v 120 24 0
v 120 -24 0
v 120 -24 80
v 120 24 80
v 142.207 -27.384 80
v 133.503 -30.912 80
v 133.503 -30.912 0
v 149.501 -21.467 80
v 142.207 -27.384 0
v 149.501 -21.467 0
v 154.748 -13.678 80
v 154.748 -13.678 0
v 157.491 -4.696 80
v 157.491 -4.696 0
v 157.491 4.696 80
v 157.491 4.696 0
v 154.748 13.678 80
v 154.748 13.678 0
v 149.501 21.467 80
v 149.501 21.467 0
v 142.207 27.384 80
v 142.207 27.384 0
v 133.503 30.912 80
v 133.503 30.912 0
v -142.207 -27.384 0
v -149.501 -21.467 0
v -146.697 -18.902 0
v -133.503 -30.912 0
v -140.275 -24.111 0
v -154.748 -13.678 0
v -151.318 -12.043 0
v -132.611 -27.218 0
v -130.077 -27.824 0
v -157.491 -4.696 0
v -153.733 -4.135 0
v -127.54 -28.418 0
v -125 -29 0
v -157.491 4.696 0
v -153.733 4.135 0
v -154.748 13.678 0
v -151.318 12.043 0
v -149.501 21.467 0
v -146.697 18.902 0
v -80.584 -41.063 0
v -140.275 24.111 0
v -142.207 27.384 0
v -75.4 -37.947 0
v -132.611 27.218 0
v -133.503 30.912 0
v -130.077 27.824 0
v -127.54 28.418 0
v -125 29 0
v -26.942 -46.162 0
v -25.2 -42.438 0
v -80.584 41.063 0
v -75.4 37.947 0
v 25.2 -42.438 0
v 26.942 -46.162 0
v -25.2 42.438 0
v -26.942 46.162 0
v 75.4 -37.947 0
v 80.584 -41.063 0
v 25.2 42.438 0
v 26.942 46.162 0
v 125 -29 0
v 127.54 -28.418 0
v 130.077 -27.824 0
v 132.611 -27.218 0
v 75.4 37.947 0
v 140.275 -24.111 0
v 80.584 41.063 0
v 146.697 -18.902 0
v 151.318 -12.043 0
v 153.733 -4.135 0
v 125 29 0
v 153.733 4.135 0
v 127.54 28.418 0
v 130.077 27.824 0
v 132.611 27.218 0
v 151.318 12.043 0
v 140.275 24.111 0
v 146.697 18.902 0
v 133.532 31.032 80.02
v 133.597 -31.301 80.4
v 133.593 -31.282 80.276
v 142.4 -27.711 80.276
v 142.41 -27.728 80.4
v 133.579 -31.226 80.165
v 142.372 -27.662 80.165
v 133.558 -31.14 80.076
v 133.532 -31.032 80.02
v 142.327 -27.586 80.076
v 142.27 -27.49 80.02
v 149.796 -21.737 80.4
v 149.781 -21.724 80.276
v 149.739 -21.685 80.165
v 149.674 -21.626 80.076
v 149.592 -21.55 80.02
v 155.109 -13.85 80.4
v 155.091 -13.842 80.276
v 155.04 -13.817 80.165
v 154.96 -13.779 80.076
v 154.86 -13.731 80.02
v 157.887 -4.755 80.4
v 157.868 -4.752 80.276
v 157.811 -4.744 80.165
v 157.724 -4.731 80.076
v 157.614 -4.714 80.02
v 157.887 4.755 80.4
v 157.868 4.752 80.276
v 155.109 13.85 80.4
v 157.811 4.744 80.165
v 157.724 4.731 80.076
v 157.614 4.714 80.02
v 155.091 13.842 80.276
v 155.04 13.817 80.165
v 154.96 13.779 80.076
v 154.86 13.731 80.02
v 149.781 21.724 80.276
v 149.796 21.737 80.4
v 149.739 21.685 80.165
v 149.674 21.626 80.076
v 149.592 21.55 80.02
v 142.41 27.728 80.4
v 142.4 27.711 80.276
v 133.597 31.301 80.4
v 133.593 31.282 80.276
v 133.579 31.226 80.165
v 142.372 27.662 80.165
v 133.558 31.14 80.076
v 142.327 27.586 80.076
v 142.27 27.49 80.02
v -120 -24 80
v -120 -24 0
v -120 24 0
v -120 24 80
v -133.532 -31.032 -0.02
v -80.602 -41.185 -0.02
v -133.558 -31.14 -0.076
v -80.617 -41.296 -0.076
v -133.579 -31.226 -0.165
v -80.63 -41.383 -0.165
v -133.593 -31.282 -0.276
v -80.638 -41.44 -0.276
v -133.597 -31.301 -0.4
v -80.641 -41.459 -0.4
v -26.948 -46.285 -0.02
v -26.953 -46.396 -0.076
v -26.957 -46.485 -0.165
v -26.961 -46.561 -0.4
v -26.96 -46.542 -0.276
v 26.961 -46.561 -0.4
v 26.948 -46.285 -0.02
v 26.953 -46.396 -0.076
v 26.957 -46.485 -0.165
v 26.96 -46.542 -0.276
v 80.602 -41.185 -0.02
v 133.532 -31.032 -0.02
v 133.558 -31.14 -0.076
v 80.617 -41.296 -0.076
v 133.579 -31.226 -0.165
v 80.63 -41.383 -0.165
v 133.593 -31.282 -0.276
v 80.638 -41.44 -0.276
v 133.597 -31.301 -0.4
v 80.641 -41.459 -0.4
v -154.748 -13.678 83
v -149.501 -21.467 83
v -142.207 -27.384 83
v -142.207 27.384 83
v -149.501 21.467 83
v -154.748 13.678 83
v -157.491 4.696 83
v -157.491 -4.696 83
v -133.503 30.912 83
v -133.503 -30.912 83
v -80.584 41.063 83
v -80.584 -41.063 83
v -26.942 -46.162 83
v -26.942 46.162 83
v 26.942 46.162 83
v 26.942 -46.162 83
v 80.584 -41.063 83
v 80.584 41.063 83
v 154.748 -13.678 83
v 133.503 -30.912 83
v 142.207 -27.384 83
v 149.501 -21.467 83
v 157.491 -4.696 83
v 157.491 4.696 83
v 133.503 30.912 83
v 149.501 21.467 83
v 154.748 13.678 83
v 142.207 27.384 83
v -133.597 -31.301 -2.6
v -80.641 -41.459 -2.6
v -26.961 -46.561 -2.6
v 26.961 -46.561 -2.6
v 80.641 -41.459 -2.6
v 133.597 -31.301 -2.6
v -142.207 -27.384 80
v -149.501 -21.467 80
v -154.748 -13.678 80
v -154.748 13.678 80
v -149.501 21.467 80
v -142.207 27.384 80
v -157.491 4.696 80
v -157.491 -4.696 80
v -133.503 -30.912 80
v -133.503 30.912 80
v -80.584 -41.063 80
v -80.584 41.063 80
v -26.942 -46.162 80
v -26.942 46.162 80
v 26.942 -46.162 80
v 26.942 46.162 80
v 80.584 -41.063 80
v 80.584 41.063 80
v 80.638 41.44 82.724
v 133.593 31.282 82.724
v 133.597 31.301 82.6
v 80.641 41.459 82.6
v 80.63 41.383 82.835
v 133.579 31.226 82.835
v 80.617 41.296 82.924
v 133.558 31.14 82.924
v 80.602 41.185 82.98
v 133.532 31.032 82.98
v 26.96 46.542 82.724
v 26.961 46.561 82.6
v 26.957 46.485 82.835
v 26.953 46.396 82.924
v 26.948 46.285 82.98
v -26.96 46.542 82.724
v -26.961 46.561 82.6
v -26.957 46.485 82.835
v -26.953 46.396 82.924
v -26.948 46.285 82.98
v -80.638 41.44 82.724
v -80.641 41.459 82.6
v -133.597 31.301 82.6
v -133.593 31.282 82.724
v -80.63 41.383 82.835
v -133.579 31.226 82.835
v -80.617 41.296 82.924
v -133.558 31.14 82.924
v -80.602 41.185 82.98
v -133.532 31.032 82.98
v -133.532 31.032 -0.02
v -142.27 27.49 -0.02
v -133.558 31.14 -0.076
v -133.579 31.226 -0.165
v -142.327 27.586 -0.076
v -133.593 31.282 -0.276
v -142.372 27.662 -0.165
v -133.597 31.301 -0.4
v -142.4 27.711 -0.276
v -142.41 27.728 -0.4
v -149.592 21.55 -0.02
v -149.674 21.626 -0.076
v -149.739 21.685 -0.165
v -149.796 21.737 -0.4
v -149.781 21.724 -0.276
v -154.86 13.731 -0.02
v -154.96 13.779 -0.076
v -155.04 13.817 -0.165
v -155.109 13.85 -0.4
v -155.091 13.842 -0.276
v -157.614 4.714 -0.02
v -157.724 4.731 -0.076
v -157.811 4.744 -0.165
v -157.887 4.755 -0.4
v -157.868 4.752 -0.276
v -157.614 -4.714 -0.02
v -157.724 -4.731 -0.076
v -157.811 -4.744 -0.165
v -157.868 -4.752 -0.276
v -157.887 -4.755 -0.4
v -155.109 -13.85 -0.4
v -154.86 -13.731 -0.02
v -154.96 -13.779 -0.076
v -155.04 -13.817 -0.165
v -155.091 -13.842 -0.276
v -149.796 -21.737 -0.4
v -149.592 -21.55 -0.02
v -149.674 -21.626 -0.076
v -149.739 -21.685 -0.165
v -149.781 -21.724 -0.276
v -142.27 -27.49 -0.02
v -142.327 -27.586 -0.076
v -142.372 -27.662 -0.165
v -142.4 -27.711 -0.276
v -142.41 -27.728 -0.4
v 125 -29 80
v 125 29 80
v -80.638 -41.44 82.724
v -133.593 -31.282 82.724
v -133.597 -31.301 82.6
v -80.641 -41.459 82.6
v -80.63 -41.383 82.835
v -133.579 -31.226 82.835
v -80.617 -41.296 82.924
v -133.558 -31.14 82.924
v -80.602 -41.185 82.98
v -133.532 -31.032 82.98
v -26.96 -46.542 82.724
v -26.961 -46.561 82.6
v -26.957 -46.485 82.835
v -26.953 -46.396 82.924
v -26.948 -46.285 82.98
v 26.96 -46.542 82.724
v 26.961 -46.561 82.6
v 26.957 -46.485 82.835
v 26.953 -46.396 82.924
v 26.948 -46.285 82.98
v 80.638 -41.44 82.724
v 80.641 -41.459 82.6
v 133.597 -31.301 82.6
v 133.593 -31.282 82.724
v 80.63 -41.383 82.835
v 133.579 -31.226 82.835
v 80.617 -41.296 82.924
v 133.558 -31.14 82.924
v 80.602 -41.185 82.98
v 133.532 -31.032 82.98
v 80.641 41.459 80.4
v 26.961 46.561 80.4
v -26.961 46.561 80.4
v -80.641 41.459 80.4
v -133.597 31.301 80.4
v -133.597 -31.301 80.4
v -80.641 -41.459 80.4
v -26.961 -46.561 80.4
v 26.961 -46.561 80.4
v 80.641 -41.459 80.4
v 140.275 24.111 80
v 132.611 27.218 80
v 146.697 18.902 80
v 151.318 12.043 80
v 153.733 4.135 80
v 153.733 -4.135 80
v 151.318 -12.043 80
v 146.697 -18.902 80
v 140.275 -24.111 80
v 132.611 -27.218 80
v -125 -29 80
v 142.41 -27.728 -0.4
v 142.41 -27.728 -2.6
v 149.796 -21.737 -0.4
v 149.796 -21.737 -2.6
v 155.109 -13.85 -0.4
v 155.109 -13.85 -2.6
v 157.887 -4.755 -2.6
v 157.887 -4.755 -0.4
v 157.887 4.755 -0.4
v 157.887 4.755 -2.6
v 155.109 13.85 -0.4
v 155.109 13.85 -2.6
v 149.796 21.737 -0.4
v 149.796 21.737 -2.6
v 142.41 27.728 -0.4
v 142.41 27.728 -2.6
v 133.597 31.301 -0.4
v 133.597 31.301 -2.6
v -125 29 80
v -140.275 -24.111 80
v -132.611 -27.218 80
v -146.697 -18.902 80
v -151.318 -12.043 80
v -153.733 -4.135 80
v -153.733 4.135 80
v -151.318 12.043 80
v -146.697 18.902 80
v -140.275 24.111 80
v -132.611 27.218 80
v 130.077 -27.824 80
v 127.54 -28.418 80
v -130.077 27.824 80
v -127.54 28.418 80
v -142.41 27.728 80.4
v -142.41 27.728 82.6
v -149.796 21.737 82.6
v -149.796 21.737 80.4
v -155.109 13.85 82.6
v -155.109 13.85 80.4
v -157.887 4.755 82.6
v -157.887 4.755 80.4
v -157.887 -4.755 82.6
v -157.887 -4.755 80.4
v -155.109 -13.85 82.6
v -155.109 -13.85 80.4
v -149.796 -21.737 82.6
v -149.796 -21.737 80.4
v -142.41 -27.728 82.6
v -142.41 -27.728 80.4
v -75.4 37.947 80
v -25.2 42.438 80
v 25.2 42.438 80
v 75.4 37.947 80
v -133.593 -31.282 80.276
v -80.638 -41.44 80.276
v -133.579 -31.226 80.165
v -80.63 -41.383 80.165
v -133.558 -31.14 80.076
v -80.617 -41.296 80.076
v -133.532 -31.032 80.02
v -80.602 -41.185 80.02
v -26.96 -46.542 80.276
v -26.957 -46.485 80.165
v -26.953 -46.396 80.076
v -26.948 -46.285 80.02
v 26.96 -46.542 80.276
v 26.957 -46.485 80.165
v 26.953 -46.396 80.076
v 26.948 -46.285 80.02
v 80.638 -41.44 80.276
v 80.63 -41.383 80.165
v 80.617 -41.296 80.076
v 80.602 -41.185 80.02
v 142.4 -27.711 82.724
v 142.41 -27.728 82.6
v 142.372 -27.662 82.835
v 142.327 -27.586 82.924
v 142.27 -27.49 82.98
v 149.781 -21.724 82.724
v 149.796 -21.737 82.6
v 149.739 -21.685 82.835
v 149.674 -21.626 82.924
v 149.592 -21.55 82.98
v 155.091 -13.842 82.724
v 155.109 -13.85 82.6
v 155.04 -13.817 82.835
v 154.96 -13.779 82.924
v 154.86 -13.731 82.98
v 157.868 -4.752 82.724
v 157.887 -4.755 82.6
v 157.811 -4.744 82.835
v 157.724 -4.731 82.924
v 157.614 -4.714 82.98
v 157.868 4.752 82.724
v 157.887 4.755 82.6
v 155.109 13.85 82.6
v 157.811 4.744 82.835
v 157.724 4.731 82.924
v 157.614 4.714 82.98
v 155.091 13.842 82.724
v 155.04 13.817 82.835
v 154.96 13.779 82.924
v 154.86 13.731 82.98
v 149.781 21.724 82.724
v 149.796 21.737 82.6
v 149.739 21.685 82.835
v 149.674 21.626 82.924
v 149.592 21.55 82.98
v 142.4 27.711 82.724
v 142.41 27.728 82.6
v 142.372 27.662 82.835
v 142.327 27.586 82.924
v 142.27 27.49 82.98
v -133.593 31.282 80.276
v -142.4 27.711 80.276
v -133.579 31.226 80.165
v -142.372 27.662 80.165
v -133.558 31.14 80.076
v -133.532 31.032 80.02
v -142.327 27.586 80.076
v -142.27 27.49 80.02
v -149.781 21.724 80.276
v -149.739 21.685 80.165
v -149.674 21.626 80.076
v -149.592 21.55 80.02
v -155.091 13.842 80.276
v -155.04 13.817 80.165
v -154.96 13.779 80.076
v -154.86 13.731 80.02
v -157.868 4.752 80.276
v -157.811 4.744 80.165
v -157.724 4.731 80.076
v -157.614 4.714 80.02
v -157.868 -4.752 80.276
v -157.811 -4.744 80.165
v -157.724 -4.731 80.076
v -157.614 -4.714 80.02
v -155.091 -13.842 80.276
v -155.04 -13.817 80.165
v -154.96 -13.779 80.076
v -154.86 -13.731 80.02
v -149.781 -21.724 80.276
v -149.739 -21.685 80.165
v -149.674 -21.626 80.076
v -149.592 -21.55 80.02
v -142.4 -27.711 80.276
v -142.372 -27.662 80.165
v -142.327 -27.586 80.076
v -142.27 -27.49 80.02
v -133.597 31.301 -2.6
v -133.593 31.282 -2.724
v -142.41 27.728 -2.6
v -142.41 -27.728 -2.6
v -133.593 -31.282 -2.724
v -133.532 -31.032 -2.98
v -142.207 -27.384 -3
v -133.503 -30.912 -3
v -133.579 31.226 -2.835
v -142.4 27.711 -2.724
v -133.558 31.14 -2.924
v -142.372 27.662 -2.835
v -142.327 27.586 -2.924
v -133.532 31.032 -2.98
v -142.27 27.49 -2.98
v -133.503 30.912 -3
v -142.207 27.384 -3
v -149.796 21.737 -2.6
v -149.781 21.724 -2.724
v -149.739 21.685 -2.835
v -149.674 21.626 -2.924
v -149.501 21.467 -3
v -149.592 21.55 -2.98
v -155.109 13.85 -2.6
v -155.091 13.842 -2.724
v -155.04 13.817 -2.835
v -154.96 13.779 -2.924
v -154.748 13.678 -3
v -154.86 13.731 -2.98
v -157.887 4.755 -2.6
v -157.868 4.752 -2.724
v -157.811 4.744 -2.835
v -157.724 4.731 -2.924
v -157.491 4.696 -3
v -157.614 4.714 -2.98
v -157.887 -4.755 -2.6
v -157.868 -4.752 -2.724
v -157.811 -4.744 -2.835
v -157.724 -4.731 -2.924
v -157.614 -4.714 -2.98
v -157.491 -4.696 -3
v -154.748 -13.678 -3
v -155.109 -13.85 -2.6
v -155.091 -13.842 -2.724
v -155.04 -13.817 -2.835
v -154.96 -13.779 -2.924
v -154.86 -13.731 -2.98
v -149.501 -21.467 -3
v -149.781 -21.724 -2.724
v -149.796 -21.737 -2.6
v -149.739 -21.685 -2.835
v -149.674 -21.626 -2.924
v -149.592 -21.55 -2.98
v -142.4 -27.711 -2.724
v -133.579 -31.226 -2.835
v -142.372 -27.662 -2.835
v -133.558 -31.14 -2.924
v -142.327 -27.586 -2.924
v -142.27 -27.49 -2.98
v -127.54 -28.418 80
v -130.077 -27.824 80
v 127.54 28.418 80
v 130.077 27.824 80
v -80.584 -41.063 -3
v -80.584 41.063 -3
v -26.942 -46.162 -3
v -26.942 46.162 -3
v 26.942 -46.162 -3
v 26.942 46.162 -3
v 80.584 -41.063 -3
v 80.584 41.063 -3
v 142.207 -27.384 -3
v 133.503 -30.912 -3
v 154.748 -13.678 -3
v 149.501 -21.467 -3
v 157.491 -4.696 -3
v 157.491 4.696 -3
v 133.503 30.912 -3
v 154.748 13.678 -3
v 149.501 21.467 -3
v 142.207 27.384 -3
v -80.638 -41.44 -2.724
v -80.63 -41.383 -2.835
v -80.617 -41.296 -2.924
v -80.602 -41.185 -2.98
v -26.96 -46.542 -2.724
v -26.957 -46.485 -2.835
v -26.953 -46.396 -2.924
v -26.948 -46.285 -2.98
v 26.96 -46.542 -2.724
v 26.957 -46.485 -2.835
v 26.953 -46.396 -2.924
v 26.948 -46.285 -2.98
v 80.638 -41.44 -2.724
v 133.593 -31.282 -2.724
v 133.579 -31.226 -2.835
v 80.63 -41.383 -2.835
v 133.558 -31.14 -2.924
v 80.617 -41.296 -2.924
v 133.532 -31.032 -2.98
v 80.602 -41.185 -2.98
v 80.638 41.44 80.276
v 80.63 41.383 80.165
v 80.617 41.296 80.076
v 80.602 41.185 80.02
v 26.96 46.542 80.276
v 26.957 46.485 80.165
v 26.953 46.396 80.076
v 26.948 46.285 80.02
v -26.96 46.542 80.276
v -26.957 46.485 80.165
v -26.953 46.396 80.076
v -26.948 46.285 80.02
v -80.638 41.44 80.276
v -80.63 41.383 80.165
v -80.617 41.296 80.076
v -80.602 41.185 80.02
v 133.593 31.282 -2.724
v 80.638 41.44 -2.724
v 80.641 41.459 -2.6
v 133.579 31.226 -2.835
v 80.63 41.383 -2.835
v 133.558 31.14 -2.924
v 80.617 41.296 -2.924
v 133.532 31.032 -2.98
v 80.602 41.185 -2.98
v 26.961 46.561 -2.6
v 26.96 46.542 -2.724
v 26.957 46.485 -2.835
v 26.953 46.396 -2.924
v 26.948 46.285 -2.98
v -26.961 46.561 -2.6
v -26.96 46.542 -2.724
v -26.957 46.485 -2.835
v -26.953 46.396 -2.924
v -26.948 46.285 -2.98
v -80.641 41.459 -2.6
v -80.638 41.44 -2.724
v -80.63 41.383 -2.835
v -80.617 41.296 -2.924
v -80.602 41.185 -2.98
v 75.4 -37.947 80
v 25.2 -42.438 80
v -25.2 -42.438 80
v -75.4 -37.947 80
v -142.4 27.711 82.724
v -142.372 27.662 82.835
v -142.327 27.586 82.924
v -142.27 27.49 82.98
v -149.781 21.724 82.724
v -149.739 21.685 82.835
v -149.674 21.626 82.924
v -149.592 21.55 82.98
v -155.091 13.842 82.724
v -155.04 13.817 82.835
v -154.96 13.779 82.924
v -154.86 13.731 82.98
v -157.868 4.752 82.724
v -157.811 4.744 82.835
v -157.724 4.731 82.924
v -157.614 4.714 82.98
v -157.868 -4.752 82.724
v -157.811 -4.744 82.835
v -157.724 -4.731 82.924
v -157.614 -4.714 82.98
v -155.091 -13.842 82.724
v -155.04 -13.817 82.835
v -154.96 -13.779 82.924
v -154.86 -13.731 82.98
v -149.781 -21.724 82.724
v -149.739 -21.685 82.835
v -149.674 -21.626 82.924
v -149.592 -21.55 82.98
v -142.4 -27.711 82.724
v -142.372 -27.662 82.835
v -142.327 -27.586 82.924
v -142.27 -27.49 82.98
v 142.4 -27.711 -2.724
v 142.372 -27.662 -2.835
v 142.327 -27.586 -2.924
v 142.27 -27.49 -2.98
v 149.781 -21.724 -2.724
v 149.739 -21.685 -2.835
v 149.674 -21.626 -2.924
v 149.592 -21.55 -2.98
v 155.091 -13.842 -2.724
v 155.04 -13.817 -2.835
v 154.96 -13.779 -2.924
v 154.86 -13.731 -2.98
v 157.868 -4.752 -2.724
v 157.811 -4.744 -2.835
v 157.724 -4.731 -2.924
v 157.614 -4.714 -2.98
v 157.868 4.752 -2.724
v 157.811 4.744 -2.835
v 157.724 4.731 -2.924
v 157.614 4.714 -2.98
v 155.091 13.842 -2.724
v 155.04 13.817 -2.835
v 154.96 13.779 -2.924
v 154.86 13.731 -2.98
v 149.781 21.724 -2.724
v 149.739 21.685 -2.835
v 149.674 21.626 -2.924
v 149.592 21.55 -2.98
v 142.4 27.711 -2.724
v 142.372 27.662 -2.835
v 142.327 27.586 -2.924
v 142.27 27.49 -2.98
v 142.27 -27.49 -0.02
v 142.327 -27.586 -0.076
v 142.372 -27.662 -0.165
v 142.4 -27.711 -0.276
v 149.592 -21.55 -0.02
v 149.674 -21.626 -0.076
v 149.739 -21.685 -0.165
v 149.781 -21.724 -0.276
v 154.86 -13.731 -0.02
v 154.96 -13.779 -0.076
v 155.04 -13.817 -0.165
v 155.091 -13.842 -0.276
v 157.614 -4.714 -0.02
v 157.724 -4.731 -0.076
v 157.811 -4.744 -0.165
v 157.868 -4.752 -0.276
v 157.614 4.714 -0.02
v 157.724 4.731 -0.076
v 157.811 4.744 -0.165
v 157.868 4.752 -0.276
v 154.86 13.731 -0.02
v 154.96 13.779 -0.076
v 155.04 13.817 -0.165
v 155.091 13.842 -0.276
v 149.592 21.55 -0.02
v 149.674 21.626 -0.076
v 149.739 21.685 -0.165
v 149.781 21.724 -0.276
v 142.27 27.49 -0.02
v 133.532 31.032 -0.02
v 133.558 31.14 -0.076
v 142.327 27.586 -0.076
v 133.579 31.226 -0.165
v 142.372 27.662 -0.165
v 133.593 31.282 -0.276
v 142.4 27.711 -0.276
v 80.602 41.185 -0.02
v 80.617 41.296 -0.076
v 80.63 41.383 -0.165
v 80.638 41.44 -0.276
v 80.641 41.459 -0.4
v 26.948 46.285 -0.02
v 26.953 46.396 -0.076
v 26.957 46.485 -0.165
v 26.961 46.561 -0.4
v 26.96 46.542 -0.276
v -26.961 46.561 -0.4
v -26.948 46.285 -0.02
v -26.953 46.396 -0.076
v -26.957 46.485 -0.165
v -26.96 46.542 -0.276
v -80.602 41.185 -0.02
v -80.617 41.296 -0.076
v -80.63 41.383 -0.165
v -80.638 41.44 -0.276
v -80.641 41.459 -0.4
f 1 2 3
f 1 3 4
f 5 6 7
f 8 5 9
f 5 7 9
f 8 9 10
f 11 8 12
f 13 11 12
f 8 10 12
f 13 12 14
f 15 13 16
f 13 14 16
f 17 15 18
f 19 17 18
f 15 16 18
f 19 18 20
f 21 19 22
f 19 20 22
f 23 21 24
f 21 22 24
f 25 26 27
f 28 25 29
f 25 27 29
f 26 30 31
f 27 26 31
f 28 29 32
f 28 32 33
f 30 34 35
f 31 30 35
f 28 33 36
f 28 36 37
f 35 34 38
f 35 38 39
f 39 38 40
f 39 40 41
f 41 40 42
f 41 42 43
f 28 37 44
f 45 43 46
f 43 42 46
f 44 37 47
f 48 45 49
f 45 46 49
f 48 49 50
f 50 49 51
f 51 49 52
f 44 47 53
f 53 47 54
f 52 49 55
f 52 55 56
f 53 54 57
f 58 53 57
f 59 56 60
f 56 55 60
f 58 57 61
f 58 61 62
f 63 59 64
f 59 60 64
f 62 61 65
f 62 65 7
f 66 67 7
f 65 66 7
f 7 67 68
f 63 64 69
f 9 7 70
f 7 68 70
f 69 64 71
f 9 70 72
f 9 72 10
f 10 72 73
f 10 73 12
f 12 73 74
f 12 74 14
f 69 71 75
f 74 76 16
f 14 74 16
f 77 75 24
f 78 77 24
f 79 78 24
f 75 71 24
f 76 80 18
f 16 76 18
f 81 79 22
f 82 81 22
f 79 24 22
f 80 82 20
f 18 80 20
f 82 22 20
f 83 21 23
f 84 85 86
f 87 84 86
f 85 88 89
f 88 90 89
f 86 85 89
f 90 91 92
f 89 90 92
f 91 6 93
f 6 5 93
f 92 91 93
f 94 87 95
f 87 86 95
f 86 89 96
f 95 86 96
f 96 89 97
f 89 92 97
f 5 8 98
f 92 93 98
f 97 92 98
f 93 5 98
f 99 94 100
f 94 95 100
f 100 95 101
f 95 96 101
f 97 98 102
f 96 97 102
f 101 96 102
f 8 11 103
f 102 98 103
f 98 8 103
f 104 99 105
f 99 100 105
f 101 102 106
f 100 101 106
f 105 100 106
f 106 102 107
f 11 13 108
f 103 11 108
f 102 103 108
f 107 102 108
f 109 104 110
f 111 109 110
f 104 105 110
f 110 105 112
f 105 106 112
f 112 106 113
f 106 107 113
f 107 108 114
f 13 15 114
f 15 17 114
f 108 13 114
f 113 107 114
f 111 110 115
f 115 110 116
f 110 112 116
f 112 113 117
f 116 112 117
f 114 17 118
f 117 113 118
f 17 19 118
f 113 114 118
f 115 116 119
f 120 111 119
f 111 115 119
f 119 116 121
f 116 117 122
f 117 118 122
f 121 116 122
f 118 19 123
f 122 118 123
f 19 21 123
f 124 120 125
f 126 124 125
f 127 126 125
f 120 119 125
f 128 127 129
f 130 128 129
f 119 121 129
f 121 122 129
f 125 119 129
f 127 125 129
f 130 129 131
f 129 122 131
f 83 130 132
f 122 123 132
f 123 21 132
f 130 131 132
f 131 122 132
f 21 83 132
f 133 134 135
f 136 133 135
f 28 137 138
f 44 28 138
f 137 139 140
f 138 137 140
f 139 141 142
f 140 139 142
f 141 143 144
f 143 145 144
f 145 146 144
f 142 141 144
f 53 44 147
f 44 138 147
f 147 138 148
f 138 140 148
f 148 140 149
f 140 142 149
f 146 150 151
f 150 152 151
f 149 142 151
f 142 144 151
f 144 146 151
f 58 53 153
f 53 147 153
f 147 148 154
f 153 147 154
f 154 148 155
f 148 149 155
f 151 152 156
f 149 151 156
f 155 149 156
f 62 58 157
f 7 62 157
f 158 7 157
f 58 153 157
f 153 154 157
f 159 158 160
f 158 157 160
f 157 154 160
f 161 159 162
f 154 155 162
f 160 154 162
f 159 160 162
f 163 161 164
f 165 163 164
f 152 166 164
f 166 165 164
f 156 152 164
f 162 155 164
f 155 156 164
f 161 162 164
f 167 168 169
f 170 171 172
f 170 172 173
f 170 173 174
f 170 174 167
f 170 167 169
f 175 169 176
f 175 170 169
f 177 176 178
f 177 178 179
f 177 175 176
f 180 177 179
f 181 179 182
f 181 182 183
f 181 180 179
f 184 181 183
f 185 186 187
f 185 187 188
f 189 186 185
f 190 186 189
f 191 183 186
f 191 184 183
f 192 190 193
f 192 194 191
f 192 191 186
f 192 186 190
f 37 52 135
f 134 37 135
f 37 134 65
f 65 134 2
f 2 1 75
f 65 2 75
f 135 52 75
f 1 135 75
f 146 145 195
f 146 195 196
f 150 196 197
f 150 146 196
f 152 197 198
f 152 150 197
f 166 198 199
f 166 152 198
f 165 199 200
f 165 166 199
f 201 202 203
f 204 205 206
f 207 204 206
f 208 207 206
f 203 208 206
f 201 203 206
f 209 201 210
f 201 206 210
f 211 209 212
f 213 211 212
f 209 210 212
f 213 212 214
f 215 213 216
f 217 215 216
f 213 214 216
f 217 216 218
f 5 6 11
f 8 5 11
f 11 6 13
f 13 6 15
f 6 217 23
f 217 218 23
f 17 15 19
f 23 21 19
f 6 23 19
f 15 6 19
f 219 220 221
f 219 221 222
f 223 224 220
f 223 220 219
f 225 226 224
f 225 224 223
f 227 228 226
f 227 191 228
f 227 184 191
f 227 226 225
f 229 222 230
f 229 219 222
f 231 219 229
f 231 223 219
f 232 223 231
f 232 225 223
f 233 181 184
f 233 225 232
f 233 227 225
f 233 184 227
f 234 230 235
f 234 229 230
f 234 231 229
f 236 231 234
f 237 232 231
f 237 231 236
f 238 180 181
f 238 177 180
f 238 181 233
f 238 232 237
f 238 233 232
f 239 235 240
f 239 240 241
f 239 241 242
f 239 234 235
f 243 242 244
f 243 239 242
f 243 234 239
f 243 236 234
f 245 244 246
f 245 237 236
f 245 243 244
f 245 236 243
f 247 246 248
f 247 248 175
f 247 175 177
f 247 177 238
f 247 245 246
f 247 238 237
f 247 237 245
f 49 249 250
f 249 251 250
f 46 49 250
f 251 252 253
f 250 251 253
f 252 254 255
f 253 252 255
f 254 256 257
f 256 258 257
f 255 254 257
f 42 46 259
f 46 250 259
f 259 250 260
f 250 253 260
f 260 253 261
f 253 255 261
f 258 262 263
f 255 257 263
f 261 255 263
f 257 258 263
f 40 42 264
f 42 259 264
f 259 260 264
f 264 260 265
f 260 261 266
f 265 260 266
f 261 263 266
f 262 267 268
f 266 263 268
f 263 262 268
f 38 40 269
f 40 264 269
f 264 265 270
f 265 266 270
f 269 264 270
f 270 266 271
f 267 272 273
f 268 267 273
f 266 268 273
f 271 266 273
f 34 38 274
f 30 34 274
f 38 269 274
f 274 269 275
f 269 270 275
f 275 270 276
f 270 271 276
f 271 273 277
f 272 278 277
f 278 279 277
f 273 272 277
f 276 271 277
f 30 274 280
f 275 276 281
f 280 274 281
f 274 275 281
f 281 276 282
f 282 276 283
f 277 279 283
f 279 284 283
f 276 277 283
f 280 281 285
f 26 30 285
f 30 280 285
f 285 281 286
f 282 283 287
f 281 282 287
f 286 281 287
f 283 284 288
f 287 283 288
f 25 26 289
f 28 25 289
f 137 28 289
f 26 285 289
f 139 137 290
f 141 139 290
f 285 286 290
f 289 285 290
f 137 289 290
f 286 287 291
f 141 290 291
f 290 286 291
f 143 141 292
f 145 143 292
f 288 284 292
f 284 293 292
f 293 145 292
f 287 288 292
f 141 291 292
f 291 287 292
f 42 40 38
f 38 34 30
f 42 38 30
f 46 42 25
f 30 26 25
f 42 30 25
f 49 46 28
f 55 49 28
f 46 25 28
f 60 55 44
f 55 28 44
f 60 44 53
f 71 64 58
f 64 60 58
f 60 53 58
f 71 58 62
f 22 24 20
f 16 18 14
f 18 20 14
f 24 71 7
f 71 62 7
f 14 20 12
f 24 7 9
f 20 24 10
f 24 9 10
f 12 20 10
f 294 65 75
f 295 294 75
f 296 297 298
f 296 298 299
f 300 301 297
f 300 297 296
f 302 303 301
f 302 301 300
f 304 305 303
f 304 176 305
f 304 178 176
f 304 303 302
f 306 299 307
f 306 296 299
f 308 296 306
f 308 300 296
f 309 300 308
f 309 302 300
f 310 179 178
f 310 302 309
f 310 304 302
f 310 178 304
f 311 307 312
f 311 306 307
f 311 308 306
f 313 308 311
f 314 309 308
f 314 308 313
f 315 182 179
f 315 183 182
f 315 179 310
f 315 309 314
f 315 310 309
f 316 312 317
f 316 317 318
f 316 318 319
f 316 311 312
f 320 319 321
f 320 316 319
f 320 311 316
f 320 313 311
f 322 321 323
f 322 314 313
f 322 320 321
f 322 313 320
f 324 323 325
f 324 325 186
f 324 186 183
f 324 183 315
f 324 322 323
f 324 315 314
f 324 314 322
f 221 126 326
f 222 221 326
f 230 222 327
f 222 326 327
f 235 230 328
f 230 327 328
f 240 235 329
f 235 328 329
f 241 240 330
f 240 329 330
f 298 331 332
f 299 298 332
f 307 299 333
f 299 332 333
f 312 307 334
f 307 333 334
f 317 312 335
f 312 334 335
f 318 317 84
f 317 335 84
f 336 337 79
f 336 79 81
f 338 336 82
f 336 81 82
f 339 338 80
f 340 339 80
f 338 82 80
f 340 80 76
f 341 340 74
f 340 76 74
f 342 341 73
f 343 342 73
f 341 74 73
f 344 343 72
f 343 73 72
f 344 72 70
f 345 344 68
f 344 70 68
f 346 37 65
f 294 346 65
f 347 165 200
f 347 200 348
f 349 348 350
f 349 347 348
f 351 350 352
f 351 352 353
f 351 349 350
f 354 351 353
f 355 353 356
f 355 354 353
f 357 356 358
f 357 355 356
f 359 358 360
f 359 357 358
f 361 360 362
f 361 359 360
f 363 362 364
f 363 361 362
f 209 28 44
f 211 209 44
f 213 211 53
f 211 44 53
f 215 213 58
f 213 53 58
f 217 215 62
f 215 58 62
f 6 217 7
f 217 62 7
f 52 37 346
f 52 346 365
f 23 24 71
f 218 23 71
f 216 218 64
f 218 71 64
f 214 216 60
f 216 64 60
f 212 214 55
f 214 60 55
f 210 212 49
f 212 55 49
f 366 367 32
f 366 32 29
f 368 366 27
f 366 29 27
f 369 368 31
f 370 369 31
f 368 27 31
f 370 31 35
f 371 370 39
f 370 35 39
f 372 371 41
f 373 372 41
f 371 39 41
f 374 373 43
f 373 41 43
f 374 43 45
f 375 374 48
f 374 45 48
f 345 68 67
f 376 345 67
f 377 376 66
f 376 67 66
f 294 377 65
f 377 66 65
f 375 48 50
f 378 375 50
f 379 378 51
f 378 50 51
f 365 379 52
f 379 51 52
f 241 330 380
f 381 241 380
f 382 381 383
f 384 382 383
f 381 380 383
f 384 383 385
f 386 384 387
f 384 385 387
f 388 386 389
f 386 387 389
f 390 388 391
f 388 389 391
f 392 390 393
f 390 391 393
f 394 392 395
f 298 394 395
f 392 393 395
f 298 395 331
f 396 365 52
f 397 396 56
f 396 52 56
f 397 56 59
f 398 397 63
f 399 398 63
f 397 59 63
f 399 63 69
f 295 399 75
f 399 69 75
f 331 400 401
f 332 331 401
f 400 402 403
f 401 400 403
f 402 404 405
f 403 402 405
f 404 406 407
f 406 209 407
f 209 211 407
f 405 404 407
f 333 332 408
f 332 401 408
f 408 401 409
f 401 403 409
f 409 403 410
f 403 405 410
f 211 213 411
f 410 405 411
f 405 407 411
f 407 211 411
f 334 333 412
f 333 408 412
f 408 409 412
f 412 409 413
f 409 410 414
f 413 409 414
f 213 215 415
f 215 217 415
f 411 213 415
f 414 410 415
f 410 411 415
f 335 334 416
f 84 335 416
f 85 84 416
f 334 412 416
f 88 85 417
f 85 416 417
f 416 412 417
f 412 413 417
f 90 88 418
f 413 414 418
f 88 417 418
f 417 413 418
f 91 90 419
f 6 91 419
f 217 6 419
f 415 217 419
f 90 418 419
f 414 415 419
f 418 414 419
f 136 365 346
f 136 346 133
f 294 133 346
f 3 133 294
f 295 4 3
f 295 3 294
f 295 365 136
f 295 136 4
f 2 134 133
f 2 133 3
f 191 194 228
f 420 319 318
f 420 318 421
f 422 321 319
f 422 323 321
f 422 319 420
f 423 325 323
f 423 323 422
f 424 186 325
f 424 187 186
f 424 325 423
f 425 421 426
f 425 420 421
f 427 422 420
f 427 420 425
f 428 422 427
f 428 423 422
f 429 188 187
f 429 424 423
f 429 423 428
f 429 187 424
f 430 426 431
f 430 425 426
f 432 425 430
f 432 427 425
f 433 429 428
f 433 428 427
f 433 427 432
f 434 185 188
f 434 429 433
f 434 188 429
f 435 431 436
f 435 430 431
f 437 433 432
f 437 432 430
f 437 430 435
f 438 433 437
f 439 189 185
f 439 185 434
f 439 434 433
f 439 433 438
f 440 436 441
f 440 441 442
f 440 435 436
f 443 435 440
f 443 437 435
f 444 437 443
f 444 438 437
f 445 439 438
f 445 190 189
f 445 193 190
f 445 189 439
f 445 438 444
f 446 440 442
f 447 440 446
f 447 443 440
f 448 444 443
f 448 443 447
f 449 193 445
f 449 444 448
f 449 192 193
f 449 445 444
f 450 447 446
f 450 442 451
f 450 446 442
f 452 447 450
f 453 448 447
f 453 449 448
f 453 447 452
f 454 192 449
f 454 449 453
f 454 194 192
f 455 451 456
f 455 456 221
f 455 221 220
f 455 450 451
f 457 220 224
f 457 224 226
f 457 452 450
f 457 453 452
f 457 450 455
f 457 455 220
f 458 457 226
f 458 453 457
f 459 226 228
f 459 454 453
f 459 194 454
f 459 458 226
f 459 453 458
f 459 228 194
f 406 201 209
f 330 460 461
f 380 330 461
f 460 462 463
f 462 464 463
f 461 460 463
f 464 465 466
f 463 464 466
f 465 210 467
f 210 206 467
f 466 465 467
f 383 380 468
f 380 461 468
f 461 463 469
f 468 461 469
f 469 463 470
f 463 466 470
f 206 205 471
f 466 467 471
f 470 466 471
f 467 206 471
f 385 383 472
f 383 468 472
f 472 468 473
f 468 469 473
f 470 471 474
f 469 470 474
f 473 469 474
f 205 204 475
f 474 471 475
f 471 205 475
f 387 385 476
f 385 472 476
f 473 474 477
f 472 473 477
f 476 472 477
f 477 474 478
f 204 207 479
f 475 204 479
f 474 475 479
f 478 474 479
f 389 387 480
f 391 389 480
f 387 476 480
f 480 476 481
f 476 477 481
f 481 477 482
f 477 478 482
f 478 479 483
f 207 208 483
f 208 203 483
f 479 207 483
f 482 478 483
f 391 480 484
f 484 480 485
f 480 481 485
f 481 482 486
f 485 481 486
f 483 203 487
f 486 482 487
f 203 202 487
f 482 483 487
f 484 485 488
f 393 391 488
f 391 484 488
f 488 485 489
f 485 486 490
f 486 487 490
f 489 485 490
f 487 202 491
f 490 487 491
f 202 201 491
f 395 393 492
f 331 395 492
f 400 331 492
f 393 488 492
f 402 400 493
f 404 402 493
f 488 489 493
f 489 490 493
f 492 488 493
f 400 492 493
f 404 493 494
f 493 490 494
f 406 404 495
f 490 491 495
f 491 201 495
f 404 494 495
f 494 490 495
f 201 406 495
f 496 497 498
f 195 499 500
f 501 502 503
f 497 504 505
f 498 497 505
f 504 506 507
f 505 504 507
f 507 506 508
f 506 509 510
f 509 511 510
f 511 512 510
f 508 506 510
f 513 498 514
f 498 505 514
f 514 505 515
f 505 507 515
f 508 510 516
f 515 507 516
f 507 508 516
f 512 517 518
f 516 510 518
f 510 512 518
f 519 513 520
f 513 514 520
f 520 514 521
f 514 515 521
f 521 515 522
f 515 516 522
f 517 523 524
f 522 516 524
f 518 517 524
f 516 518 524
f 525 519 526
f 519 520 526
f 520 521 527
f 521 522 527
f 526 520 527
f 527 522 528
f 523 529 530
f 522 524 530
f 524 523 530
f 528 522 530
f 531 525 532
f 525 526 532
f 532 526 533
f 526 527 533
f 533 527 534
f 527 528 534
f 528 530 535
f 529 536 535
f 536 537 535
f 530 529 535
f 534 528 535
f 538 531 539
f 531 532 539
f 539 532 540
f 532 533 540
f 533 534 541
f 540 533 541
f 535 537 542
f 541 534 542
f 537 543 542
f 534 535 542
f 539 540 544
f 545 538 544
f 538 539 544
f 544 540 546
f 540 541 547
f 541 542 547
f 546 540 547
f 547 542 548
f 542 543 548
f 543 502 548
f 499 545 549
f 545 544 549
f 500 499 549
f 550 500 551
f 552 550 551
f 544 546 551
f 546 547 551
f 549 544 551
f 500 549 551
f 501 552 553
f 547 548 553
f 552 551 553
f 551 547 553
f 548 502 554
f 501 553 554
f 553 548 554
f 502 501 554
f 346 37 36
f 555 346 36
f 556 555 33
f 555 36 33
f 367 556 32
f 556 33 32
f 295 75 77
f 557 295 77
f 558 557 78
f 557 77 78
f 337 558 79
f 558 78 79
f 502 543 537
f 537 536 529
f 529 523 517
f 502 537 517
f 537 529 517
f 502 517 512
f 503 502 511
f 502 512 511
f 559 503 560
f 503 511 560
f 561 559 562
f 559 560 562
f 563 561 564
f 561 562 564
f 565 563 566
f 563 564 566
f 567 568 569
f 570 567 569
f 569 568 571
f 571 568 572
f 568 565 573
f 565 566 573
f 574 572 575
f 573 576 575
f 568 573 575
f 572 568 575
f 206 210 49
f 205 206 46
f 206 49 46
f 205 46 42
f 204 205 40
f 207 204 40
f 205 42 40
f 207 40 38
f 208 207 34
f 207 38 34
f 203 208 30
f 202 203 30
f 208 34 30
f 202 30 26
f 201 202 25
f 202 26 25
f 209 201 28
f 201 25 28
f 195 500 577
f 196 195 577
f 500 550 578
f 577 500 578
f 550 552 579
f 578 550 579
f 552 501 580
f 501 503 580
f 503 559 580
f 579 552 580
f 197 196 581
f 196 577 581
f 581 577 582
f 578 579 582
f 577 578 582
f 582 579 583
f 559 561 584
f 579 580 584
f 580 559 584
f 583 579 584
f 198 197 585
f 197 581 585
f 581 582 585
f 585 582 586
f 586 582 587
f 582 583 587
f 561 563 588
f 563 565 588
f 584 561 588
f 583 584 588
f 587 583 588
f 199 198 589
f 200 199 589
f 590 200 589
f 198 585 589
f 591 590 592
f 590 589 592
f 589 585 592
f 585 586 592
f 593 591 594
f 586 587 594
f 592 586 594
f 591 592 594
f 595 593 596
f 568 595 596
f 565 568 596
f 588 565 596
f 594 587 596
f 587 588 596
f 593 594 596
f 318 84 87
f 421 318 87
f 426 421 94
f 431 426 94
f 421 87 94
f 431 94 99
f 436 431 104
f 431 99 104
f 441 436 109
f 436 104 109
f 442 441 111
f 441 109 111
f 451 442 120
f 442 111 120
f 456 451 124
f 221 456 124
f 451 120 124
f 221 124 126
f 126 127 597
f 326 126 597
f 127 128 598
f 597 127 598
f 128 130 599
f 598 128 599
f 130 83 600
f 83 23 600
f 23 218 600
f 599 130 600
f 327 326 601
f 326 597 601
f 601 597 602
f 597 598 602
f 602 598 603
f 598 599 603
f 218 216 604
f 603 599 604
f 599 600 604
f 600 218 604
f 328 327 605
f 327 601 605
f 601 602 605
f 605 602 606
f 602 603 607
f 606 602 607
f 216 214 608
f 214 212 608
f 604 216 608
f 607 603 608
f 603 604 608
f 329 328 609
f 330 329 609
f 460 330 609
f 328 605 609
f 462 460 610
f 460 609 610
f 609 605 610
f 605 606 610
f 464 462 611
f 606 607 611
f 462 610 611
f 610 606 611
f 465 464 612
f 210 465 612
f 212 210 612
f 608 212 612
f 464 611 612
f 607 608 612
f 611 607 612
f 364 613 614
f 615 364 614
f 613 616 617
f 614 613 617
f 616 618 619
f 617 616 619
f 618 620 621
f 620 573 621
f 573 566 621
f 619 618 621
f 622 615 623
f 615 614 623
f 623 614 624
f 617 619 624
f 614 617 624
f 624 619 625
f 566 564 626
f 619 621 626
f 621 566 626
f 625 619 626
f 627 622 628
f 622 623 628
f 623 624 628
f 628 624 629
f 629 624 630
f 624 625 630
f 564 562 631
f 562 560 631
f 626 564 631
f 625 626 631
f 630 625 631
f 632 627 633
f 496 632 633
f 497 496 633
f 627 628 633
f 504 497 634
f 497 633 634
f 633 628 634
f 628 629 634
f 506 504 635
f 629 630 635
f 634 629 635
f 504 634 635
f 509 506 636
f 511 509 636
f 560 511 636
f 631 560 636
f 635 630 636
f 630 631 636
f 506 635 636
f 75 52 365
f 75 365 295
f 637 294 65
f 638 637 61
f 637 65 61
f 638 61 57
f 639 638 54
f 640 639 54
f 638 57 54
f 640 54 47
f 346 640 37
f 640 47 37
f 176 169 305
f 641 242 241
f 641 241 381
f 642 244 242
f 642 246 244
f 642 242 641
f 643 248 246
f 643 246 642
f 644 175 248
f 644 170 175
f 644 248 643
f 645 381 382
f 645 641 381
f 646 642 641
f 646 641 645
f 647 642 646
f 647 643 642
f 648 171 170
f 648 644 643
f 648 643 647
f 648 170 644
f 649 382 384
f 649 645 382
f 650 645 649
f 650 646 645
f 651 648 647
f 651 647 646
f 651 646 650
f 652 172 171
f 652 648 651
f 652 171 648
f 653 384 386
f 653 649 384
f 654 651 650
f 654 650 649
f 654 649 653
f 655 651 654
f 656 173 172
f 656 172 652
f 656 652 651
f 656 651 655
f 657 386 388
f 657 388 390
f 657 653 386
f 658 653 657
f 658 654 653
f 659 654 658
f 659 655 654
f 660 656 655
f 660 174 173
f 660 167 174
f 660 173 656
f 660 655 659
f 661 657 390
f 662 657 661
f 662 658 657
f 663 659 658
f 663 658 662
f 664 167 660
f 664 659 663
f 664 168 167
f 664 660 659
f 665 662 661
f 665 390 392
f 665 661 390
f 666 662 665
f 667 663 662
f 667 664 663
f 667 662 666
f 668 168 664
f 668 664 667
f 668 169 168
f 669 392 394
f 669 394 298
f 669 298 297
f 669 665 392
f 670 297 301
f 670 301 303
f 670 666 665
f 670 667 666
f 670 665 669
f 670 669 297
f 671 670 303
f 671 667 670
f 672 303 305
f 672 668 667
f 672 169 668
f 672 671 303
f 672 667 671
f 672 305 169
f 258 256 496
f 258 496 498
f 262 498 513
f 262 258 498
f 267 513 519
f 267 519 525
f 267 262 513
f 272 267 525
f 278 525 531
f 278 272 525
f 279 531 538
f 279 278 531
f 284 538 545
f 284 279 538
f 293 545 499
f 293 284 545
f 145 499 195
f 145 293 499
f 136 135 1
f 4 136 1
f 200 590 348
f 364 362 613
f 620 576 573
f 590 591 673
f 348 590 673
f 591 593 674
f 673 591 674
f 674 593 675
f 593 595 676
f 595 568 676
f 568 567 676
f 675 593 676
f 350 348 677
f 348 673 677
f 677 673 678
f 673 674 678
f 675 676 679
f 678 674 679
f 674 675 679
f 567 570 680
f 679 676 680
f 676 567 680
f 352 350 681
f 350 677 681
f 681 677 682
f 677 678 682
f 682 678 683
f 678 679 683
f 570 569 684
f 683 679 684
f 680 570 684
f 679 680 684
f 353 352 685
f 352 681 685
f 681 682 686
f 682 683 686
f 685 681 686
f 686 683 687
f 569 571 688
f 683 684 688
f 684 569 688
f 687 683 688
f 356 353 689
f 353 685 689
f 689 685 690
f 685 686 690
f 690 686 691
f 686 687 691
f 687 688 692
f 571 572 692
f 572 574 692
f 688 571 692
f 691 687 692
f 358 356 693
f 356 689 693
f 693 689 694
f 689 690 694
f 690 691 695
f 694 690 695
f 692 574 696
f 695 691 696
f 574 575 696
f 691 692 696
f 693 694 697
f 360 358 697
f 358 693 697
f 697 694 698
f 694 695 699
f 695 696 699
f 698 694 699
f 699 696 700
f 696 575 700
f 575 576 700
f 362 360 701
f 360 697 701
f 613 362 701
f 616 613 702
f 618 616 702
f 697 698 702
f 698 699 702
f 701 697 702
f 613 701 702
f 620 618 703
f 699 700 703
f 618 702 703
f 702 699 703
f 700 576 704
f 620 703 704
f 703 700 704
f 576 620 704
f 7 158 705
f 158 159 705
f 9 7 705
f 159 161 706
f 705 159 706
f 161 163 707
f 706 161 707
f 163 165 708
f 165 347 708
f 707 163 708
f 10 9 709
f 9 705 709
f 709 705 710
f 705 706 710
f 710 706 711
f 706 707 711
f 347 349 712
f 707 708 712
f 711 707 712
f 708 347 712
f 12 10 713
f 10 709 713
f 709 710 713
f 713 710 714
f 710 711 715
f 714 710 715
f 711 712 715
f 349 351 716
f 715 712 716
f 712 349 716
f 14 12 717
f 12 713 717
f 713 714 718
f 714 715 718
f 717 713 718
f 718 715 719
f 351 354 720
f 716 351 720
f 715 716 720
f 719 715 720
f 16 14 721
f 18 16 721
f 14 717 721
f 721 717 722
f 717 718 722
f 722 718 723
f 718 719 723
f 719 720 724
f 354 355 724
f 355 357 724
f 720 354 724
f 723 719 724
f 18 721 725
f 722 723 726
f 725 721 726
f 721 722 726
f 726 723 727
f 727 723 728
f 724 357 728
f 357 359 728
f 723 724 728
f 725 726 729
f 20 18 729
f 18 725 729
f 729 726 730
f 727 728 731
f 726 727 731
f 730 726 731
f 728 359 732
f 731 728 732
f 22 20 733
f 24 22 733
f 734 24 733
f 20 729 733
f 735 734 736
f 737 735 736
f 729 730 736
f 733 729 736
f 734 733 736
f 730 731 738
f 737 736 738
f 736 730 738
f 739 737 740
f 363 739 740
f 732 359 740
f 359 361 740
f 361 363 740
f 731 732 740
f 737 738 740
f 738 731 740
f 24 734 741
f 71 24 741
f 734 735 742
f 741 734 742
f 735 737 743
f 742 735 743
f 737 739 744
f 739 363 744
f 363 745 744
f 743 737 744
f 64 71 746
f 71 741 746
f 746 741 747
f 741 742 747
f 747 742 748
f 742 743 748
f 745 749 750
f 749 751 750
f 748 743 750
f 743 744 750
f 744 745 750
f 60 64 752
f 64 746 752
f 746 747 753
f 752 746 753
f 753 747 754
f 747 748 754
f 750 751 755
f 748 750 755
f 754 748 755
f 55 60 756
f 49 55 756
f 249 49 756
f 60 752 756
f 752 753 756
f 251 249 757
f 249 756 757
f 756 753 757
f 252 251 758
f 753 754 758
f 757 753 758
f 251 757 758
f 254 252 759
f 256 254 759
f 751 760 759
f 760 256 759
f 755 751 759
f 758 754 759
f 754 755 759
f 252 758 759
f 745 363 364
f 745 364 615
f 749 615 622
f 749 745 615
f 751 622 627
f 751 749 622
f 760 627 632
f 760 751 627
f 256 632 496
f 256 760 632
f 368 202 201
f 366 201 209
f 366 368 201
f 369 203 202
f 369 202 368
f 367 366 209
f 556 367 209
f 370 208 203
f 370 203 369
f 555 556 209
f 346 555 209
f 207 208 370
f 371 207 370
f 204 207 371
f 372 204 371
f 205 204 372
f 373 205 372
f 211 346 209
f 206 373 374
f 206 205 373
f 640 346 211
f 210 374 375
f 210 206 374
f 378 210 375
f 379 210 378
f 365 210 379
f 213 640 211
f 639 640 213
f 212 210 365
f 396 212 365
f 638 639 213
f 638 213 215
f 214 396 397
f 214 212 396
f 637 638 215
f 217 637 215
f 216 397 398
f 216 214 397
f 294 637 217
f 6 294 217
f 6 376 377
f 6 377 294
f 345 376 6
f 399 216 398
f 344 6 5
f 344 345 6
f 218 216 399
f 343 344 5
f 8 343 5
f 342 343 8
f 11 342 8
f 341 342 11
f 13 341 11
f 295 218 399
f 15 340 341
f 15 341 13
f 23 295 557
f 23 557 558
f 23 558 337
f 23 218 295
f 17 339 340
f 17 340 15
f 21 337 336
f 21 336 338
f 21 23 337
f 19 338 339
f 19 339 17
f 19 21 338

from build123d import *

# Parameters (mm, degrees)
F1_DEPTH = 80
F0_W     = 250
F0_H     = 58
F0_W_2   = 240
F0_H_2   = 48
F2_DEPTH = 3
F6_DEPTH = 3
F7_R     = 0.4
F7_2_R   = 0.4


with BuildPart() as f1:
    # F0 (on Top) → F1 (new body)
    with BuildSketch(Plane.XY):
        with BuildLine():
            ThreePointArc((133.503282126, -30.9117909157), (157.83995965, 0), (133.503282126, 30.9117909157))
            ThreePointArc((133.503282126, 30.9117909157), (0, 46.8), (-133.503282126, 30.9117909157))
            ThreePointArc((-133.503282126, 30.9117909157), (-157.83995965, 0), (-133.503282126, -30.9117909157))
            ThreePointArc((-133.503282126, -30.9117909157), (0, -46.8), (133.503282126, -30.9117909157))
        make_face()
        with BuildLine():
            ThreePointArc((-125, 29), (0, 43), (125, 29))
            ThreePointArc((125, 29), (128.8088011875, 28.1221277515), (132.6114385597, 27.2179291082))
            ThreePointArc((132.6114385597, 27.2179291082), (154.03995965, 0), (132.6114385597, -27.2179291082))
            ThreePointArc((132.6114385597, -27.2179291082), (128.8088011875, -28.1221277515), (125, -29))
            ThreePointArc((125, -29), (0, -43), (-125, -29))
            ThreePointArc((-125, -29), (-128.8088011875, -28.1221277515), (-132.6114385597, -27.2179291082))
            ThreePointArc((-132.6114385597, -27.2179291082), (-154.03995965, 0), (-132.6114385597, 27.2179291082))
            ThreePointArc((-132.6114385597, 27.2179291082), (-128.8088011875, 28.1221277515), (-125, 29))
        make_face(mode=Mode.SUBTRACT)
    extrude(amount=F1_DEPTH)


with BuildPart() as f1b:
    # F0 (on Top) → F1, piece 2 (new body)
    with BuildSketch(Plane.XY):
        Rectangle(F0_W, F0_H)
        Rectangle(F0_W_2, F0_H_2, mode=Mode.SUBTRACT)
    extrude(amount=F1_DEPTH)


with BuildPart() as f2:
    # F0 (on Top) + F1_face (on face) → F2 (new body)
    with BuildSketch(Plane.XY):
        with BuildLine():
            ThreePointArc((133.5971603962, -31.3006184744), (158.23995965, 0), (133.5971603962, 31.3006184744))
            ThreePointArc((133.5971603962, 31.3006184744), (0, 47.2), (-133.5971603962, 31.3006184744))
            ThreePointArc((-133.5971603962, 31.3006184744), (-158.23995965, 0), (-133.5971603962, -31.3006184744))
            ThreePointArc((-133.5971603962, -31.3006184744), (0, -47.2), (133.5971603962, -31.3006184744))
        make_face()
        with BuildLine():
            ThreePointArc((-133.503282126, 30.9117909157), (0, 46.8), (133.503282126, 30.9117909157))
            ThreePointArc((133.503282126, 30.9117909157), (157.83995965, 0), (133.503282126, -30.9117909157))
            ThreePointArc((133.503282126, -30.9117909157), (0, -46.8), (-133.503282126, -30.9117909157))
            ThreePointArc((-133.503282126, -30.9117909157), (-157.83995965, 0), (-133.503282126, 30.9117909157))
        make_face(mode=Mode.SUBTRACT)
        with BuildLine():
            ThreePointArc((132.6114385597, 27.2179291082), (128.8088011875, 28.1221277515), (125, 29))
            Line((125, 29), (125, -29))
            ThreePointArc((125, -29), (128.8088011875, -28.1221277515), (132.6114385597, -27.2179291082))
            ThreePointArc((132.6114385597, -27.2179291082), (154.03995965, 0), (132.6114385597, 27.2179291082))
        make_face()
        with BuildLine():
            Line((-125, 29), (125, 29))
            ThreePointArc((125, 29), (0, 43), (-125, 29))
        make_face()
        Rectangle(F0_W, F0_H)
        Rectangle(F0_W_2, F0_H_2, mode=Mode.SUBTRACT)
        Rectangle(F0_W_2, F0_H_2)
        with BuildLine():
            ThreePointArc((-125, -29), (0, -43), (125, -29))
            Line((125, -29), (-125, -29))
        make_face()
        with BuildLine():
            Line((-125, -29), (-125, 29))
            ThreePointArc((-125, 29), (-128.8088011875, 28.1221277515), (-132.6114385597, 27.2179291082))
            ThreePointArc((-132.6114385597, 27.2179291082), (-154.03995965, 0), (-132.6114385597, -27.2179291082))
            ThreePointArc((-132.6114385597, -27.2179291082), (-128.8088011875, -28.1221277515), (-125, -29))
        make_face()
    with BuildSketch(Plane(origin=(1.1e-09, 0, 0), x_dir=(1, 0, 0), z_dir=(0, 0, -1))):
        with BuildLine():
            ThreePointArc((-133.5032821272, 30.9117909157), (-157.8399596511, 0), (-133.5032821272, -30.9117909158))
            ThreePointArc((-133.5032821272, -30.9117909158), (-1.1e-09, -46.8), (133.5032821249, -30.9117909158))
            ThreePointArc((133.5032821249, -30.9117909158), (157.8399596489, 0), (133.5032821249, 30.9117909157))
            ThreePointArc((133.5032821249, 30.9117909157), (-1.1e-09, 46.8), (-133.5032821272, 30.9117909157))
        make_face()
        with BuildLine():
            ThreePointArc((132.6114385585, -27.2179291081), (-1.2e-09, -43), (-132.6114385609, -27.2179291082))
            ThreePointArc((-132.6114385609, -27.2179291082), (-154.0399596511, 0), (-132.6114385609, 27.2179291082))
            ThreePointArc((-132.6114385609, 27.2179291083), (-1.1e-09, 43), (132.6114385586, 27.2179291082))
            ThreePointArc((132.6114385586, 27.2179291082), (154.0399596489, 0), (132.6114385586, -27.2179291082))
        make_face(mode=Mode.SUBTRACT)
    extrude(amount=-F2_DEPTH, dir=(0, 0, 1))

    # F3: union 

    # F4: union 

    # F7#2
    f7_2_edges = [f2.edges().sort_by_distance(p)[0] for p in [
        (-158.23996, 0, 0),
        (0, -47.2, 0),
        (158.23996, 0, 0),
        (0, 47.2, 0),
        (-158.23996, 0, -3),
        (0, -47.2, -3),
        (158.23996, 0, -3),
        (0, 47.2, -3),
    ]]
    fillet(f7_2_edges, radius=F7_2_R)


with BuildPart() as f6:
    # F5 (on face) → F6 (new body)
    with BuildSketch(Plane.XY.offset(80)):
        with BuildLine():
            ThreePointArc((-133.5971603962, 31.3006184744), (-158.23995965, 0), (-133.5971603962, -31.3006184744))
            ThreePointArc((-133.5971603962, -31.3006184744), (0, -47.2), (133.5971603962, -31.3006184744))
            ThreePointArc((133.5971603962, -31.3006184744), (158.23995965, 0), (133.5971603962, 31.3006184744))
            ThreePointArc((133.5971603962, 31.3006184744), (0, 47.2), (-133.5971603962, 31.3006184744))
        make_face()
    extrude(amount=F6_DEPTH)

    # F7
    f7_edges = [f6.edges().sort_by_distance(p)[0] for p in [
        (-158.23996, 0, 83),
        (0, -47.2, 83),
        (158.23996, 0, 83),
        (0, 47.2, 83),
        (-158.23996, 0, 80),
        (0, -47.2, 80),
        (158.23996, 0, 80),
        (0, 47.2, 80),
    ]]
    fillet(f7_edges, radius=F7_R)


solid = Compound([f1.part, f1b.part, f2.part, f6.part])
